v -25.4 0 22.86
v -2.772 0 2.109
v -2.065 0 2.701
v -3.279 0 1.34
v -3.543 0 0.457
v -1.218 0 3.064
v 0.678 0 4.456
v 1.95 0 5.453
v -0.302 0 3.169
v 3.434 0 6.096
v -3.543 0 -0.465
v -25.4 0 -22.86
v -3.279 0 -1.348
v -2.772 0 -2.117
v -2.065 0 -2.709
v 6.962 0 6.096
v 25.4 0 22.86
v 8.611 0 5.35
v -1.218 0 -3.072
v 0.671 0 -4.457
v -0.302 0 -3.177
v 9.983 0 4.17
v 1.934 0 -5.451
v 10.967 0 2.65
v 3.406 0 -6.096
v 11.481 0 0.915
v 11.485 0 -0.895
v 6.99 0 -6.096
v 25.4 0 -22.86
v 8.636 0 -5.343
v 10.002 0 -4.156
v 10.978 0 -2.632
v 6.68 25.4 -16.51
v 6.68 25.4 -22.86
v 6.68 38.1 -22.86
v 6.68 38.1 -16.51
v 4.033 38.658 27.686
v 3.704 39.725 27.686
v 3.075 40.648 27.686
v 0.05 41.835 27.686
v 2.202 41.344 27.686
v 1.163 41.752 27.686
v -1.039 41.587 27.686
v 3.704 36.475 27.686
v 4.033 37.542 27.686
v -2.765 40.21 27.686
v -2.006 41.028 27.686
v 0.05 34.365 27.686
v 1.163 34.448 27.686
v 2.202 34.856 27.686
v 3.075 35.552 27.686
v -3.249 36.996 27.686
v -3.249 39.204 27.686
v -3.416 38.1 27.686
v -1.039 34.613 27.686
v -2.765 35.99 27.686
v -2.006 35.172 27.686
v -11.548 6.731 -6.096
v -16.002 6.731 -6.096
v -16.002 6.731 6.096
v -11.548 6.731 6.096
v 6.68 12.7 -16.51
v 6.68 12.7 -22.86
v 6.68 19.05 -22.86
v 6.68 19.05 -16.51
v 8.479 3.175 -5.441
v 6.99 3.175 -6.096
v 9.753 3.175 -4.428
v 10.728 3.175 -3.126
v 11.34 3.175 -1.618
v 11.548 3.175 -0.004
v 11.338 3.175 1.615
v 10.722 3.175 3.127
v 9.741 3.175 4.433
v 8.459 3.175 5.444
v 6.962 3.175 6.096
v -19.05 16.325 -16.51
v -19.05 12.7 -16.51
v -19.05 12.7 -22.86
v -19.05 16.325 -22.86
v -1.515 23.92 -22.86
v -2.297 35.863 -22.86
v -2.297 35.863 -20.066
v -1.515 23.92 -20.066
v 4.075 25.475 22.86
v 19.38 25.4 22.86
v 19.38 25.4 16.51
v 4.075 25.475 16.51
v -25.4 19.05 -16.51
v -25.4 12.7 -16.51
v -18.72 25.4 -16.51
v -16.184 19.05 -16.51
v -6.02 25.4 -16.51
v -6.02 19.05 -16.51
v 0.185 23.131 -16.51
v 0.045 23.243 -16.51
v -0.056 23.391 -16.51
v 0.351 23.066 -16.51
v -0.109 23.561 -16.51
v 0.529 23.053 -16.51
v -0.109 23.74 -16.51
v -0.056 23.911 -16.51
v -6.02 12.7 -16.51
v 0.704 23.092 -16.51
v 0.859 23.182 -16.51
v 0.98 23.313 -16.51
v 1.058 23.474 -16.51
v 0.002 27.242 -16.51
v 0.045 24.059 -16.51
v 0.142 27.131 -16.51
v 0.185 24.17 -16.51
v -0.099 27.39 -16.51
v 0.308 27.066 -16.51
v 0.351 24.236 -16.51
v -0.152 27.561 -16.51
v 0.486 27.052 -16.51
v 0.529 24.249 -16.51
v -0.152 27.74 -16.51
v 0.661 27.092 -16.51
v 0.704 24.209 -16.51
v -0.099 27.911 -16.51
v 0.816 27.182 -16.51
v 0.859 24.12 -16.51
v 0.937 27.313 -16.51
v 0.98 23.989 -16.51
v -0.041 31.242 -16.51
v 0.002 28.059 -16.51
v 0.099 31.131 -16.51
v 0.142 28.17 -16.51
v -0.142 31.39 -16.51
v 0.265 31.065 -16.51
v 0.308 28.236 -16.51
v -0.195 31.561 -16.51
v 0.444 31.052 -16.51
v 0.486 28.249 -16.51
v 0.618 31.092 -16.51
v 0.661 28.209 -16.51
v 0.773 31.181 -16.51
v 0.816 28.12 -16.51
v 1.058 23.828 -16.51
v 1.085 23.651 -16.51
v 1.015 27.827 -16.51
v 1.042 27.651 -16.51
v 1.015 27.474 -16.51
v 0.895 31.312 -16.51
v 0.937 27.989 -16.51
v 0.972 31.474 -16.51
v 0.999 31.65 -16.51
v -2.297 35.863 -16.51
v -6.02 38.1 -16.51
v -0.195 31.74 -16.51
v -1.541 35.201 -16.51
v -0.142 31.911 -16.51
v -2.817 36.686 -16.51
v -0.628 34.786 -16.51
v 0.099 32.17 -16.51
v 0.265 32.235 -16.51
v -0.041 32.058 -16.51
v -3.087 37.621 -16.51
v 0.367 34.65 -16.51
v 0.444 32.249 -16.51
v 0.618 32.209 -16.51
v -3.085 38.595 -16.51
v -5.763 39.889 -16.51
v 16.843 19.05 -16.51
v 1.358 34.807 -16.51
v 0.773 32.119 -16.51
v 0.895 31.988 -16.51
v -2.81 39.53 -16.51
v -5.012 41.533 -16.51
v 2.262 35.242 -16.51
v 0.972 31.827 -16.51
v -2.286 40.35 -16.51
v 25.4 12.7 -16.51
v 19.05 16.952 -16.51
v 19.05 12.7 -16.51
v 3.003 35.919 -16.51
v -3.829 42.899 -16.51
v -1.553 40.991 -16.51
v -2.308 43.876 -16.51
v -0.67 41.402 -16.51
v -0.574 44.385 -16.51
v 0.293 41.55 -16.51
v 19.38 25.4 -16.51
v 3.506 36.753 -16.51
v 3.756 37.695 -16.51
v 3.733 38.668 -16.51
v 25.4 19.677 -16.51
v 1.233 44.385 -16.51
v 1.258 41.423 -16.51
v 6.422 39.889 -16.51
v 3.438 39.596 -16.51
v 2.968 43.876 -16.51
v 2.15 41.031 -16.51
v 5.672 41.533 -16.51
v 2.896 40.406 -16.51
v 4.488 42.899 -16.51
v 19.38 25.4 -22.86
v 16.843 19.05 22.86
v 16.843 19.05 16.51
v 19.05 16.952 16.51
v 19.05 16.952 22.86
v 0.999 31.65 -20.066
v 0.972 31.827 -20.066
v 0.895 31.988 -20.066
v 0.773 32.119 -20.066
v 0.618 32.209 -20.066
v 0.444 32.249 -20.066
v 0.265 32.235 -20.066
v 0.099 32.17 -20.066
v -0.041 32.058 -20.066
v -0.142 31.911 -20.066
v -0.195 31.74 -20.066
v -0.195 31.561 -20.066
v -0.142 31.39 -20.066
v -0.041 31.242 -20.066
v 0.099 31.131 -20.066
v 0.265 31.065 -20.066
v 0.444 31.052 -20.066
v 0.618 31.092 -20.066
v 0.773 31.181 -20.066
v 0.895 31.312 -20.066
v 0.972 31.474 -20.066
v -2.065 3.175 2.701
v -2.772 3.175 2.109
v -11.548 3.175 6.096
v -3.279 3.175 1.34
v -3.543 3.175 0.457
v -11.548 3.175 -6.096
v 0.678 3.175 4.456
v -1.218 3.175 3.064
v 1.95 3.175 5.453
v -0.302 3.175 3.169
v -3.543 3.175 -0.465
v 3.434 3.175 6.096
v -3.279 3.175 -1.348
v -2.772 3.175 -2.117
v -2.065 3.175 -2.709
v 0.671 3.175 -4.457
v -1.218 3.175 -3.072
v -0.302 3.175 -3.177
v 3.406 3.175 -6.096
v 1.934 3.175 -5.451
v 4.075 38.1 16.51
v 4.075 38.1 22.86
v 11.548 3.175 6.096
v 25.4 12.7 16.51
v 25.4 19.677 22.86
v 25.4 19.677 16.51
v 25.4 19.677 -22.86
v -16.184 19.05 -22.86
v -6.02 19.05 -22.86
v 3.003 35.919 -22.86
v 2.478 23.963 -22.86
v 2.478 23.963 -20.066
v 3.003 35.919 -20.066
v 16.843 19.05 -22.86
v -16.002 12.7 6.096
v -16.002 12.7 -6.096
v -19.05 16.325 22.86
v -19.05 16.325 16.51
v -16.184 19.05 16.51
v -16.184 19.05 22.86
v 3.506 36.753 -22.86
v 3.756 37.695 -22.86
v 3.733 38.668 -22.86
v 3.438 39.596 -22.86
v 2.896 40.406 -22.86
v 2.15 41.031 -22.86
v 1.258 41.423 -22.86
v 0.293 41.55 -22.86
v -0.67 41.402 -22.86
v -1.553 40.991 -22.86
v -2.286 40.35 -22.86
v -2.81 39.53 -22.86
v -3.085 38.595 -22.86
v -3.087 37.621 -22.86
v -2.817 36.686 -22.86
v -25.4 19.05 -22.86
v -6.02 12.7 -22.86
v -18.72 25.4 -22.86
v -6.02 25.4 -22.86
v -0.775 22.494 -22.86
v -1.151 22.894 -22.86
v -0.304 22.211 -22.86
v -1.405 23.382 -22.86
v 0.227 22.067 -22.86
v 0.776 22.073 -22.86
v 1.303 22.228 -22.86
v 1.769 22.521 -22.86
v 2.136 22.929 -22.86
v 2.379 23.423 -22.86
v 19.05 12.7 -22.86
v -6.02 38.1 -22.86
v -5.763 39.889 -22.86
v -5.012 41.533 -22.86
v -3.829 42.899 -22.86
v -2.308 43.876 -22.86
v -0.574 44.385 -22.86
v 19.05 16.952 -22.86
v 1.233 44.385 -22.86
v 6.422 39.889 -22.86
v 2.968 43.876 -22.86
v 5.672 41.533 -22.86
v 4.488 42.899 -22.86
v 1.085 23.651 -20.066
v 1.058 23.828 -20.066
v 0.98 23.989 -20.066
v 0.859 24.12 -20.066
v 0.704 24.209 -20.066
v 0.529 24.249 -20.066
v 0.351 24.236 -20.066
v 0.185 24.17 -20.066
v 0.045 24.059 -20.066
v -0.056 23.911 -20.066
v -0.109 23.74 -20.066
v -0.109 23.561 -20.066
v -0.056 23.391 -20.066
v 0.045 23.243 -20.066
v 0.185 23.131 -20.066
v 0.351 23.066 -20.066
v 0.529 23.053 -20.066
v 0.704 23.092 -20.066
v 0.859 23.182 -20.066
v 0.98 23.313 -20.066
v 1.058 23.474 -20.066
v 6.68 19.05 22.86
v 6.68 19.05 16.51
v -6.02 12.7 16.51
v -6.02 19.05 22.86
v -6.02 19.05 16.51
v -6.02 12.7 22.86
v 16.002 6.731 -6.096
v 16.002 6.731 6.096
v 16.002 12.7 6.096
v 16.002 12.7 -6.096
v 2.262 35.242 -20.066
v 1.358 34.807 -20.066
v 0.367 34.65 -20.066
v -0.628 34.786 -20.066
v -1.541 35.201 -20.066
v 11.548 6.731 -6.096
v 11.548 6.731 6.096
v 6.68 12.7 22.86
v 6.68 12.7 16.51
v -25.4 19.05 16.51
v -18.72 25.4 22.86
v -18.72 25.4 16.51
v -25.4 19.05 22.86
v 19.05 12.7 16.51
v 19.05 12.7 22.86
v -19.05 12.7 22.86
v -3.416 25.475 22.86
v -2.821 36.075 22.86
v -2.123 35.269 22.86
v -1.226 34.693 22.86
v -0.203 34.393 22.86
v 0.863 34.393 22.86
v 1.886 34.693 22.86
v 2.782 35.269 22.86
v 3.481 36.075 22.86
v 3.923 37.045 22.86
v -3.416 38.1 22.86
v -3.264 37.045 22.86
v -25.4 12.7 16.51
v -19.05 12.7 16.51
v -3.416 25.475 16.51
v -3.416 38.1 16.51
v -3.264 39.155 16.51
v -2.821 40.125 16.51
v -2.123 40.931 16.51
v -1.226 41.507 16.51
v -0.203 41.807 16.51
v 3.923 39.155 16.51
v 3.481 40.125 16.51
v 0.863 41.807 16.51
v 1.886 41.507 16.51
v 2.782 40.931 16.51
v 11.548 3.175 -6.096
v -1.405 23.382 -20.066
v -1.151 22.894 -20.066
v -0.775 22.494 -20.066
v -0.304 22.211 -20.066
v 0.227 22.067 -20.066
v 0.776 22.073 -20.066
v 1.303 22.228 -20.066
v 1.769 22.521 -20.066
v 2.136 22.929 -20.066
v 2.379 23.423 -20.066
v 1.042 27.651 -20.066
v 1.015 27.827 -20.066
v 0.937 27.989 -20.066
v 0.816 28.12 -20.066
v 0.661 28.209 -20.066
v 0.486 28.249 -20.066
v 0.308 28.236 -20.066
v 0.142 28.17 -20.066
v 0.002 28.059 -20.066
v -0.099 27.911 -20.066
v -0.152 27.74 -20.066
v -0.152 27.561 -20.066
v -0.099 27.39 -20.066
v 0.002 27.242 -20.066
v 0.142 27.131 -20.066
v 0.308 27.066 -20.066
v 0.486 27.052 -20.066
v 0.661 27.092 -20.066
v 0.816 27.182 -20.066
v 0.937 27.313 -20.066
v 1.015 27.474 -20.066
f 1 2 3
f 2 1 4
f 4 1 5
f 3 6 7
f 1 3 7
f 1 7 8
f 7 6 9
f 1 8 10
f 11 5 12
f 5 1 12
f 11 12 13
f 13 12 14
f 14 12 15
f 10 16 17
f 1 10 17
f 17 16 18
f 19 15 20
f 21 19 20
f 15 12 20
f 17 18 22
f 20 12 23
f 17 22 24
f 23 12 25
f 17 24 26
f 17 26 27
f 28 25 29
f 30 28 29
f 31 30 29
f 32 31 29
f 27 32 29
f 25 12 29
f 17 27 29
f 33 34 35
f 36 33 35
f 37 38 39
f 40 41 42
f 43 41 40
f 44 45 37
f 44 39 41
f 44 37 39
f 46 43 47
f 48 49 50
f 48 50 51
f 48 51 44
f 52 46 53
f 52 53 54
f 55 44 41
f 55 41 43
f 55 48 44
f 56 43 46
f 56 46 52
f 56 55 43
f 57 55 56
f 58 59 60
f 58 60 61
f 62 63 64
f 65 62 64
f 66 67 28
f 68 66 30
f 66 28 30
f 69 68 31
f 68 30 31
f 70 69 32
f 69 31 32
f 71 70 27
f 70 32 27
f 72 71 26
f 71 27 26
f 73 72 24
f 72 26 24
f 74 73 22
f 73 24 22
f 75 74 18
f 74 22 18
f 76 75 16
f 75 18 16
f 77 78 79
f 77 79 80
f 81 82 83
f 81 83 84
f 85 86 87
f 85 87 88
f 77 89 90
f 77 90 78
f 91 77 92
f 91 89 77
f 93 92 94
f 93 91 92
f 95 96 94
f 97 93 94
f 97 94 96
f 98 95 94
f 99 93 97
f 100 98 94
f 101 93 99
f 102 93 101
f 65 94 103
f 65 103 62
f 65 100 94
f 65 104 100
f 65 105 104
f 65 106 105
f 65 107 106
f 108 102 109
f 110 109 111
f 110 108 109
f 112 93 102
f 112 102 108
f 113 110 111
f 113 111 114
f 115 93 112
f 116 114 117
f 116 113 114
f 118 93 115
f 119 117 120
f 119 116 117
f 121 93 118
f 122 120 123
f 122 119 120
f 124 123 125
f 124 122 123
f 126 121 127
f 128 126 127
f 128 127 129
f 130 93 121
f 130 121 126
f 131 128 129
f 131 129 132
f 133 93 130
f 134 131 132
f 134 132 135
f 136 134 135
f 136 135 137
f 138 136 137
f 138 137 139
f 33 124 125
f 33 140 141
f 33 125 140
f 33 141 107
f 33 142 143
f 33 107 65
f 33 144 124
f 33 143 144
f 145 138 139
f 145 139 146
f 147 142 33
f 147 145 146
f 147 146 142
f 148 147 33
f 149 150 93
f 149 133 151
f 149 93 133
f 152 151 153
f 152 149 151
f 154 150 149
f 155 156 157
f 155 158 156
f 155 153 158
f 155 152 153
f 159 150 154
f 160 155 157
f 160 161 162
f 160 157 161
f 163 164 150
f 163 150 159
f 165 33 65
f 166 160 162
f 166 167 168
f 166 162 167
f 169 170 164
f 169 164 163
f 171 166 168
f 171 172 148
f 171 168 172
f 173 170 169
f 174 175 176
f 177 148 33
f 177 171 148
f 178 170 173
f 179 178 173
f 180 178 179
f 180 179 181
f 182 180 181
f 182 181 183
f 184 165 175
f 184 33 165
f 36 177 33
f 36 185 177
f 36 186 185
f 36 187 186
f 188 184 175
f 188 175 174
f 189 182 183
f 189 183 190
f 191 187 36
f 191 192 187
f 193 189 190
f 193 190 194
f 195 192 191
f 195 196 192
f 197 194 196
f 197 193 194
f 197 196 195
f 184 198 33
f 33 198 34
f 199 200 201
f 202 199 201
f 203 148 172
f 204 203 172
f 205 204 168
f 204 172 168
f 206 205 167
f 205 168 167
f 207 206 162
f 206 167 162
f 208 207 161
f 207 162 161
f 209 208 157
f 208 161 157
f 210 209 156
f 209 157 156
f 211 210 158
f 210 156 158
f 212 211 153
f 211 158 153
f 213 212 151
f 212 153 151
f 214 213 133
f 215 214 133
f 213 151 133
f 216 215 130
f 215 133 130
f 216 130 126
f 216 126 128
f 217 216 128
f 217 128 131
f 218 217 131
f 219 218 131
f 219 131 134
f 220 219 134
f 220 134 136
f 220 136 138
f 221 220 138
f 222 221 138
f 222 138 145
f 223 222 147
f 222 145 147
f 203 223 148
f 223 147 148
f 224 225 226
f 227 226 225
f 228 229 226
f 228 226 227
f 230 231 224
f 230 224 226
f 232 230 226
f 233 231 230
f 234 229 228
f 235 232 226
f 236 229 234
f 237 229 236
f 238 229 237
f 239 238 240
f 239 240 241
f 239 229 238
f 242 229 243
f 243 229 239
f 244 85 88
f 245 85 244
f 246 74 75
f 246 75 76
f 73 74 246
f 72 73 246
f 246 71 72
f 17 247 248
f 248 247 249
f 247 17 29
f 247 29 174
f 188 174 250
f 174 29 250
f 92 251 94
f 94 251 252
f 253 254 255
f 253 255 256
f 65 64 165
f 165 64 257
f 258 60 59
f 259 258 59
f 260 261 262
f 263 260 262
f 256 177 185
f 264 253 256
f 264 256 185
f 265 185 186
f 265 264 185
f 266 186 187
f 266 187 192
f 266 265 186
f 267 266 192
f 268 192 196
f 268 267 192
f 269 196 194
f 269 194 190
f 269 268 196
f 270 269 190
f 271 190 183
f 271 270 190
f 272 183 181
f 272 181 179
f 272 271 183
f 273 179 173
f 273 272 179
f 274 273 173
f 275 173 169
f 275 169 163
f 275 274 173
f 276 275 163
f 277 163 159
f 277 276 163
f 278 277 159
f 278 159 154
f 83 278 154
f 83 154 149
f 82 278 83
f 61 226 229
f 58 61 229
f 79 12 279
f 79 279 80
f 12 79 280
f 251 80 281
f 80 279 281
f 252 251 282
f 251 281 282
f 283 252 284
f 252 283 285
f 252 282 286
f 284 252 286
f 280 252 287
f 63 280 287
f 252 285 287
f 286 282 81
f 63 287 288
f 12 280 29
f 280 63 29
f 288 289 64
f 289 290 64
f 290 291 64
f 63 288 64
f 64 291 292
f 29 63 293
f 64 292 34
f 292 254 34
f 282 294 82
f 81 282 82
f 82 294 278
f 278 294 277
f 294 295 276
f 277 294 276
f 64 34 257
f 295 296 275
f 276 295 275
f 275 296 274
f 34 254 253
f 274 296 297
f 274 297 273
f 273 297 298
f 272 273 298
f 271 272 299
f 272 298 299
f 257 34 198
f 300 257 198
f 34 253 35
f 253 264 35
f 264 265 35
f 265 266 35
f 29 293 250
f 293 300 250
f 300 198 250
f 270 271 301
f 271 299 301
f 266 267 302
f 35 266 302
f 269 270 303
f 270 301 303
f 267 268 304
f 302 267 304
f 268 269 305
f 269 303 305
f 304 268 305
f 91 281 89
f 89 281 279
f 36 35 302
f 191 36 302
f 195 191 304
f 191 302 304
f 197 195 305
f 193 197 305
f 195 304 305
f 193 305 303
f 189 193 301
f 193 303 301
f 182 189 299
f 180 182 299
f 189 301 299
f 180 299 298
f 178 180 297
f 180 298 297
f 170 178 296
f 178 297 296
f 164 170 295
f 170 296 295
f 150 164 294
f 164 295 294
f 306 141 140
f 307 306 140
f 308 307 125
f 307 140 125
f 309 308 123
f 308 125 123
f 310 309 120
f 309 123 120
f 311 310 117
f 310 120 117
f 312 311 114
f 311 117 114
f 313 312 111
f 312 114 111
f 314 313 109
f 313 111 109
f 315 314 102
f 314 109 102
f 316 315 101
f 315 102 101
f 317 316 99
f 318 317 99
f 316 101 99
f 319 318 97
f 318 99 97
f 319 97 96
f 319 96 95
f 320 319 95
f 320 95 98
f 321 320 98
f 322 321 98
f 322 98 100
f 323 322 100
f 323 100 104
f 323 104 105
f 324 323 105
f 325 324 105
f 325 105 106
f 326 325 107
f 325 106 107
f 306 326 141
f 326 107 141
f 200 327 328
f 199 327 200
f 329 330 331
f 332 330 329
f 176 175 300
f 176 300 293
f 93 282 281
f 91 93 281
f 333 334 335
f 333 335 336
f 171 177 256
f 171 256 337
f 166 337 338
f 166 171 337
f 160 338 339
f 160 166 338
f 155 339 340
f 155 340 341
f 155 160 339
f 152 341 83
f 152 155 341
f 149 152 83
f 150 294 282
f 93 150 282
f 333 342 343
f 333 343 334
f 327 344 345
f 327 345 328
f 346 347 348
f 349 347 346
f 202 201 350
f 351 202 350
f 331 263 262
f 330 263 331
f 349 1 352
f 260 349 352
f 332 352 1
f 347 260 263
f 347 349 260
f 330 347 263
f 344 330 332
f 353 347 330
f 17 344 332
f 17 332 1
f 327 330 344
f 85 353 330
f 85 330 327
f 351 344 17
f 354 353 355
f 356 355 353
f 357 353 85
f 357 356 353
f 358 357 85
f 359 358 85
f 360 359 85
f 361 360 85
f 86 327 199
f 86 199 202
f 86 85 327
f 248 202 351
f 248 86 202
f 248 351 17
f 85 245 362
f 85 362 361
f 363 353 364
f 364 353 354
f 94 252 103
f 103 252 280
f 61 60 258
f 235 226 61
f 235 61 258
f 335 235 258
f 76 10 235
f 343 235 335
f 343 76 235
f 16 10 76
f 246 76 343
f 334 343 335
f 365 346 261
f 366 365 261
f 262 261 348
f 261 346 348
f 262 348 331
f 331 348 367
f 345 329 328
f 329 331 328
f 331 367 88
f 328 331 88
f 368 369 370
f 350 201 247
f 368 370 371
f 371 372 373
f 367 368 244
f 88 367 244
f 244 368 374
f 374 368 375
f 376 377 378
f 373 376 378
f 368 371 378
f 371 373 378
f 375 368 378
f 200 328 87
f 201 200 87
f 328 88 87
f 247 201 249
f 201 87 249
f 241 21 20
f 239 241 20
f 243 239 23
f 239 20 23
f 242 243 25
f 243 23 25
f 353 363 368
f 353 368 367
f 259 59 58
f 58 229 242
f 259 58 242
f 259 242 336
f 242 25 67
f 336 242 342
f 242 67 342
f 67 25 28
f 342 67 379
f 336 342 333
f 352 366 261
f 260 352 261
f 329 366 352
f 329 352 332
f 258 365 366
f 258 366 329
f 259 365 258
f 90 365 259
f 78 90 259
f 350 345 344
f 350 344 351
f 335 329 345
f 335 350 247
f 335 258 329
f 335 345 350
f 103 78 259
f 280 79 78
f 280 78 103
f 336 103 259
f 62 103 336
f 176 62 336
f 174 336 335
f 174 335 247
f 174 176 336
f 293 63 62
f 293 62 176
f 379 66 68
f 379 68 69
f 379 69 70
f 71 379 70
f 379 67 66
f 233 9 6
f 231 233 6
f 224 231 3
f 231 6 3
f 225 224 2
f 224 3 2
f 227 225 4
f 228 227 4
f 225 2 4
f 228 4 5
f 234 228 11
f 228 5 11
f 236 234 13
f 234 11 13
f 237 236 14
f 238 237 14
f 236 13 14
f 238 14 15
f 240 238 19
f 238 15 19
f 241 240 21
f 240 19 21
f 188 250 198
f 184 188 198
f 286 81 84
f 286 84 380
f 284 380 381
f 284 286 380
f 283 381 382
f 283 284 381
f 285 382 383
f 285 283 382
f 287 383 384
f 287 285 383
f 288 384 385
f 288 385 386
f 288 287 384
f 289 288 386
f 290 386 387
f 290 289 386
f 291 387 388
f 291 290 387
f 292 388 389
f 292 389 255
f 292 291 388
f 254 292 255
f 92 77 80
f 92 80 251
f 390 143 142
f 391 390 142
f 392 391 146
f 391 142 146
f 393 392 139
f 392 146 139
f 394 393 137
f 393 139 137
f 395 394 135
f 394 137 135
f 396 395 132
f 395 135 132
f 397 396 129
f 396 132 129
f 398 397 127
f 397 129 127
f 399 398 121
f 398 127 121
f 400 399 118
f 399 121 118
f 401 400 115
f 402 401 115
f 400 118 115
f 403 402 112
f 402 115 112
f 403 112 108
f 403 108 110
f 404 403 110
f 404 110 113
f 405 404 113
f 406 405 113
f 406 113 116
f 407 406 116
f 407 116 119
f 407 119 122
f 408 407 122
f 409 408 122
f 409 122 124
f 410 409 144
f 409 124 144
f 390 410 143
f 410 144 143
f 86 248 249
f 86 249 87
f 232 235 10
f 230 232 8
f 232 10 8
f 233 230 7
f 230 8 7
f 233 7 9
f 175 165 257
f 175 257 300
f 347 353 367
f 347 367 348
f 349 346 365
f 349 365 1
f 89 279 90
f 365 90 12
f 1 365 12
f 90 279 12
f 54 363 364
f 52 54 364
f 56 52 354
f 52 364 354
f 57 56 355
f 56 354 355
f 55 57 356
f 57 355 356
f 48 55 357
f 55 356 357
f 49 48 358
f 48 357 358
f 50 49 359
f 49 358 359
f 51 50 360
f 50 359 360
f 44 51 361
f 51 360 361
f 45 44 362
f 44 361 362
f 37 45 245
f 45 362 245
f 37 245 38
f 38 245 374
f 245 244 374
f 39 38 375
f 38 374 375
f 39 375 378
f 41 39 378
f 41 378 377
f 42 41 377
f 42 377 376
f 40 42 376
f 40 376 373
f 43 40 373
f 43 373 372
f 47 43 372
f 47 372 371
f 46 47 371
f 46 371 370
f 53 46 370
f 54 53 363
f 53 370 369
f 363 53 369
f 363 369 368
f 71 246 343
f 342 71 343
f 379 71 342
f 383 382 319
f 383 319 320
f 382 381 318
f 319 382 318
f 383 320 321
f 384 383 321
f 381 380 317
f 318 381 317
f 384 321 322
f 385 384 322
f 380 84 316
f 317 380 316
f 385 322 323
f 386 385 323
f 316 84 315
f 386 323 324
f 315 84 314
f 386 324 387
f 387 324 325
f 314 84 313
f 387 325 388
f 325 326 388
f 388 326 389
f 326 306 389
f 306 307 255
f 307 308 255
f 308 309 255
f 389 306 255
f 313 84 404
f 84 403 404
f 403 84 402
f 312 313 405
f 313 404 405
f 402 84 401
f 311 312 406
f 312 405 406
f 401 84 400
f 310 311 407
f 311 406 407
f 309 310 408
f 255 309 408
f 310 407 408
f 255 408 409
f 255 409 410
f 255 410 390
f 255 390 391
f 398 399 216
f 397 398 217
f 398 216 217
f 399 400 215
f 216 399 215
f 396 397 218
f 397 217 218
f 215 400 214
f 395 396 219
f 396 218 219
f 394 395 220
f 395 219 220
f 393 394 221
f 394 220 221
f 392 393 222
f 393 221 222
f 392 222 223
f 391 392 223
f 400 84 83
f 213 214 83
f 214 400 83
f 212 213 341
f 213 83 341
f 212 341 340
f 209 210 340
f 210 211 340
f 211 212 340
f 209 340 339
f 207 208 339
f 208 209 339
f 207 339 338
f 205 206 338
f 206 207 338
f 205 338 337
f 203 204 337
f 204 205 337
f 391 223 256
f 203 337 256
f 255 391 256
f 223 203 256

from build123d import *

# Parameters (mm, degrees)
SKETCH1_W           = 50.8
SKETCH1_H           = 45.72
SKETCH1_W_2         = 32.004
SKETCH1_H_2         = 12.192
BOSS_EXTRUDE1_DEPTH = 12.7
BOSS_EXTRUDE2_START = -22.86
SKETCH2_R           = 1.671921998
BOSS_EXTRUDE2_DEPTH = 6.35
BOSS_EXTRUDE3_START = -16.51
SKETCH4_R           = 0.6
BOSS_EXTRUDE3_DEPTH = 3.556
BOSS_EXTRUDE4_DEPTH = 3.175
BOSS_EXTRUDE5_START = 3.175
SKETCH6_W           = 4.454
SKETCH6_H           = 12.192
BOSS_EXTRUDE5_DEPTH = 3.556
BOSS_EXTRUDE6_START = 22.86
BOSS_EXTRUDE6_DEPTH = 6.35
BOSS_EXTRUDE7_START = 22.86
SKETCH8_R           = 3.745494863
BOSS_EXTRUDE7_DEPTH = 4.826


with BuildPart() as part:
    # Sketch1 → Boss-Extrude1 (new body)
    with BuildSketch(Plane(origin=(0, 0, 0), x_dir=(1, 0, 0), z_dir=(0, 1, 0))):
        Rectangle(SKETCH1_W, SKETCH1_H)
        Rectangle(SKETCH1_W_2, SKETCH1_H_2, mode=Mode.SUBTRACT)
    extrude(amount=BOSS_EXTRUDE1_DEPTH)

    # Sketch2 → Boss-Extrude2 (add)
    # profile 1 of 2: a face of its own
    with BuildSketch(Plane.XY.offset(BOSS_EXTRUDE2_START)):
        with BuildLine():
            Line((-6.020374567, 38.1), (-6.020374567, 25.4))
            Line((-6.020374567, 25.4), (-18.720374567, 25.4))
            Line((-18.720374567, 25.4), (-25.4, 19.05))
            Line((-25.4, 19.05), (-25.4, 12.7))
            Line((-25.4, 12.7), (-19.05, 12.7))
            Line((-19.05, 12.7), (-19.05, 16.325160807))
            Line((-19.05, 16.325160807), (-16.18371572, 19.05))
            Line((-16.18371572, 19.05), (-6.020374567, 19.05))
            Line((-6.020374567, 19.05), (-6.020374567, 12.7))
            Line((-6.020374567, 12.7), (6.679625433, 12.7))
            Line((6.679625433, 12.7), (6.679625433, 19.05))
            Line((6.679625433, 19.05), (16.842966586, 19.05))
            Line((16.842966586, 19.05), (19.05, 16.951879032))
            Line((19.05, 16.951879032), (19.05, 12.7))
            Line((19.05, 12.7), (25.4, 12.7))
            Line((25.4, 12.7), (25.4, 19.676718225))
            Line((25.4, 19.676718225), (19.379625433, 25.4))
            Line((19.379625433, 25.4), (6.679625433, 25.4))
            Line((6.679625433, 25.4), (6.679625433, 38.1))
            ThreePointArc((6.679625433, 38.1), (0.329625433, 44.45), (-6.020374567, 38.1))
        make_face()
        with BuildLine():
            Line((-2.296540764, 35.862646406), (-1.515493151, 23.920283336))
            ThreePointArc((-1.515493151, 23.920283336), (0.501683423, 22.050922268), (2.478319103, 23.963099958))
            Line((2.478319103, 23.963099958), (3.003154686, 35.919463063))
            ThreePointArc((3.003154686, 35.919463063), (0.292641005, 41.549801755), (-2.296540764, 35.862646406))
        make_face(mode=Mode.SUBTRACT)
    # profile 2 of 2: a face of its own
    with BuildSketch(Plane.XY.offset(BOSS_EXTRUDE2_START)):
        with Locations((0.329625433, 38.1)):
            Circle(SKETCH2_R)
    extrude(amount=BOSS_EXTRUDE2_DEPTH)


with BuildPart() as boss_extrude2_kept_piece:
    # of the separate pieces the step leaves, the one the design keeps (boss_extrude2_pieces_kept)
    add(part.part.solids().sort_by_distance((-25.4, 0, 22.86))[0])

    # Sketch4 → Boss-Extrude3 (add)
    with BuildSketch(Plane.XY.offset(BOSS_EXTRUDE3_START)):
        with BuildLine():
            ThreePointArc((-1.515493151, 23.920283336), (0.501683423, 22.050922268), (2.478319103, 23.963099958))
            Line((2.478319103, 23.963099958), (3.003154686, 35.919463063))
            ThreePointArc((3.003154686, 35.919463063), (0.366609861, 34.650198245), (-2.296540764, 35.862646406))
            Line((-2.296540764, 35.862646406), (-1.515493151, 23.920283336))
        make_face()
        with Locations((0.484531225, 23.650830329)):
            Circle(SKETCH4_R, mode=Mode.SUBTRACT)
        with Locations((0.441650729, 27.65060048)):
            Circle(SKETCH4_R, mode=Mode.SUBTRACT)
        with Locations((0.398770233, 31.650370631)):
            Circle(SKETCH4_R, mode=Mode.SUBTRACT)
    extrude(amount=-BOSS_EXTRUDE3_DEPTH)

    # Sketch5 → Boss-Extrude4 (add)
    with BuildSketch(Plane(origin=(0, 0, 0), x_dir=(1, 0, 0), z_dir=(0, 1, 0))):
        with BuildLine():
            Line((16.002, 6.354), (5.198, 6.354))
            ThreePointArc((5.198, 6.354), (11.548, 0.004), (5.198, -6.346))
            Line((5.198, -6.346), (16.002, -6.346))
            Line((16.002, -6.346), (16.002, 6.354))
        make_face()
        with BuildLine():
            ThreePointArc((-0.302167411, 3.177430077), (2.022215136, 5.502808098), (5.198, 6.354))
            Line((5.198, 6.354), (-16.002, 6.354))
            Line((-16.002, 6.354), (-16.002, -6.346))
            Line((-16.002, -6.346), (5.198, -6.346))
            ThreePointArc((5.198, -6.346), (2.022215136, -5.494808098), (-0.302167411, -3.169430077))
            ThreePointArc((-0.302167411, -3.169430077), (-3.577, 0.004), (-0.302167411, 3.177430077))
        make_face()
    extrude(amount=BOSS_EXTRUDE4_DEPTH)

    # Sketch6 → Boss-Extrude5 (add)
    with BuildSketch(Plane(origin=(0, 0, 0), x_dir=(1, 0, 0), z_dir=(0, 1, 0)).offset(BOSS_EXTRUDE5_START)):
        with Locations((-13.775, 0)):
            Rectangle(SKETCH6_W, SKETCH6_H)
        with Locations((13.775, 0)):
            Rectangle(SKETCH6_W, SKETCH6_H)
    extrude(amount=BOSS_EXTRUDE5_DEPTH)



with BuildPart() as body_2:
    # Sketch7 → Boss-Extrude6 (new body)
    with BuildSketch(Plane.XY.offset(BOSS_EXTRUDE6_START)):
        with BuildLine():
            Line((-6.020374567, 12.7), (6.679625433, 12.7))
            Line((6.679625433, 12.7), (6.679625433, 19.05))
            Line((6.679625433, 19.05), (16.842966586, 19.05))
            Line((16.842966586, 19.05), (19.05, 16.951879032))
            Line((19.05, 16.951879032), (19.05, 12.7))
            Line((19.05, 12.7), (25.4, 12.7))
            Line((25.4, 12.7), (25.4, 19.676718225))
            Line((25.4, 19.676718225), (19.379625433, 25.4))
            Line((19.379625433, 25.4), (4.075120296, 25.475))
            Line((4.075120296, 25.475), (4.075120296, 38.1))
            ThreePointArc((4.075120296, 38.1), (0.329625433, 41.845494863), (-3.41586943, 38.1))
            Line((-3.41586943, 38.1), (-3.41586943, 25.475))
            Line((-3.41586943, 25.475), (-18.720374567, 25.4))
            Line((-18.720374567, 25.4), (-25.4, 19.05))
            Line((-25.4, 19.05), (-25.4, 12.7))
            Line((-25.4, 12.7), (-19.05, 12.7))
            Line((-19.05, 12.7), (-19.05, 16.325160807))
            Line((-19.05, 16.325160807), (-16.18371572, 19.05))
            Line((-16.18371572, 19.05), (-6.020374567, 19.05))
            Line((-6.020374567, 19.05), (-6.020374567, 12.7))
        make_face()
    extrude(amount=-BOSS_EXTRUDE6_DEPTH)


with BuildPart() as boss_extrude2_kept_piece_1:
    add(boss_extrude2_kept_piece.part)

    add(body_2.part)  # Boss-Extrude7 merges body 2
    # Sketch8 → Boss-Extrude7 (add)
    with BuildSketch(Plane.XY.offset(BOSS_EXTRUDE7_START)):
        with Locations(Location((0.329625433, 38.1, 0), (0, 0, 180))):
            Circle(SKETCH8_R)
    extrude(amount=BOSS_EXTRUDE7_DEPTH)


solid = boss_extrude2_kept_piece_1.part
